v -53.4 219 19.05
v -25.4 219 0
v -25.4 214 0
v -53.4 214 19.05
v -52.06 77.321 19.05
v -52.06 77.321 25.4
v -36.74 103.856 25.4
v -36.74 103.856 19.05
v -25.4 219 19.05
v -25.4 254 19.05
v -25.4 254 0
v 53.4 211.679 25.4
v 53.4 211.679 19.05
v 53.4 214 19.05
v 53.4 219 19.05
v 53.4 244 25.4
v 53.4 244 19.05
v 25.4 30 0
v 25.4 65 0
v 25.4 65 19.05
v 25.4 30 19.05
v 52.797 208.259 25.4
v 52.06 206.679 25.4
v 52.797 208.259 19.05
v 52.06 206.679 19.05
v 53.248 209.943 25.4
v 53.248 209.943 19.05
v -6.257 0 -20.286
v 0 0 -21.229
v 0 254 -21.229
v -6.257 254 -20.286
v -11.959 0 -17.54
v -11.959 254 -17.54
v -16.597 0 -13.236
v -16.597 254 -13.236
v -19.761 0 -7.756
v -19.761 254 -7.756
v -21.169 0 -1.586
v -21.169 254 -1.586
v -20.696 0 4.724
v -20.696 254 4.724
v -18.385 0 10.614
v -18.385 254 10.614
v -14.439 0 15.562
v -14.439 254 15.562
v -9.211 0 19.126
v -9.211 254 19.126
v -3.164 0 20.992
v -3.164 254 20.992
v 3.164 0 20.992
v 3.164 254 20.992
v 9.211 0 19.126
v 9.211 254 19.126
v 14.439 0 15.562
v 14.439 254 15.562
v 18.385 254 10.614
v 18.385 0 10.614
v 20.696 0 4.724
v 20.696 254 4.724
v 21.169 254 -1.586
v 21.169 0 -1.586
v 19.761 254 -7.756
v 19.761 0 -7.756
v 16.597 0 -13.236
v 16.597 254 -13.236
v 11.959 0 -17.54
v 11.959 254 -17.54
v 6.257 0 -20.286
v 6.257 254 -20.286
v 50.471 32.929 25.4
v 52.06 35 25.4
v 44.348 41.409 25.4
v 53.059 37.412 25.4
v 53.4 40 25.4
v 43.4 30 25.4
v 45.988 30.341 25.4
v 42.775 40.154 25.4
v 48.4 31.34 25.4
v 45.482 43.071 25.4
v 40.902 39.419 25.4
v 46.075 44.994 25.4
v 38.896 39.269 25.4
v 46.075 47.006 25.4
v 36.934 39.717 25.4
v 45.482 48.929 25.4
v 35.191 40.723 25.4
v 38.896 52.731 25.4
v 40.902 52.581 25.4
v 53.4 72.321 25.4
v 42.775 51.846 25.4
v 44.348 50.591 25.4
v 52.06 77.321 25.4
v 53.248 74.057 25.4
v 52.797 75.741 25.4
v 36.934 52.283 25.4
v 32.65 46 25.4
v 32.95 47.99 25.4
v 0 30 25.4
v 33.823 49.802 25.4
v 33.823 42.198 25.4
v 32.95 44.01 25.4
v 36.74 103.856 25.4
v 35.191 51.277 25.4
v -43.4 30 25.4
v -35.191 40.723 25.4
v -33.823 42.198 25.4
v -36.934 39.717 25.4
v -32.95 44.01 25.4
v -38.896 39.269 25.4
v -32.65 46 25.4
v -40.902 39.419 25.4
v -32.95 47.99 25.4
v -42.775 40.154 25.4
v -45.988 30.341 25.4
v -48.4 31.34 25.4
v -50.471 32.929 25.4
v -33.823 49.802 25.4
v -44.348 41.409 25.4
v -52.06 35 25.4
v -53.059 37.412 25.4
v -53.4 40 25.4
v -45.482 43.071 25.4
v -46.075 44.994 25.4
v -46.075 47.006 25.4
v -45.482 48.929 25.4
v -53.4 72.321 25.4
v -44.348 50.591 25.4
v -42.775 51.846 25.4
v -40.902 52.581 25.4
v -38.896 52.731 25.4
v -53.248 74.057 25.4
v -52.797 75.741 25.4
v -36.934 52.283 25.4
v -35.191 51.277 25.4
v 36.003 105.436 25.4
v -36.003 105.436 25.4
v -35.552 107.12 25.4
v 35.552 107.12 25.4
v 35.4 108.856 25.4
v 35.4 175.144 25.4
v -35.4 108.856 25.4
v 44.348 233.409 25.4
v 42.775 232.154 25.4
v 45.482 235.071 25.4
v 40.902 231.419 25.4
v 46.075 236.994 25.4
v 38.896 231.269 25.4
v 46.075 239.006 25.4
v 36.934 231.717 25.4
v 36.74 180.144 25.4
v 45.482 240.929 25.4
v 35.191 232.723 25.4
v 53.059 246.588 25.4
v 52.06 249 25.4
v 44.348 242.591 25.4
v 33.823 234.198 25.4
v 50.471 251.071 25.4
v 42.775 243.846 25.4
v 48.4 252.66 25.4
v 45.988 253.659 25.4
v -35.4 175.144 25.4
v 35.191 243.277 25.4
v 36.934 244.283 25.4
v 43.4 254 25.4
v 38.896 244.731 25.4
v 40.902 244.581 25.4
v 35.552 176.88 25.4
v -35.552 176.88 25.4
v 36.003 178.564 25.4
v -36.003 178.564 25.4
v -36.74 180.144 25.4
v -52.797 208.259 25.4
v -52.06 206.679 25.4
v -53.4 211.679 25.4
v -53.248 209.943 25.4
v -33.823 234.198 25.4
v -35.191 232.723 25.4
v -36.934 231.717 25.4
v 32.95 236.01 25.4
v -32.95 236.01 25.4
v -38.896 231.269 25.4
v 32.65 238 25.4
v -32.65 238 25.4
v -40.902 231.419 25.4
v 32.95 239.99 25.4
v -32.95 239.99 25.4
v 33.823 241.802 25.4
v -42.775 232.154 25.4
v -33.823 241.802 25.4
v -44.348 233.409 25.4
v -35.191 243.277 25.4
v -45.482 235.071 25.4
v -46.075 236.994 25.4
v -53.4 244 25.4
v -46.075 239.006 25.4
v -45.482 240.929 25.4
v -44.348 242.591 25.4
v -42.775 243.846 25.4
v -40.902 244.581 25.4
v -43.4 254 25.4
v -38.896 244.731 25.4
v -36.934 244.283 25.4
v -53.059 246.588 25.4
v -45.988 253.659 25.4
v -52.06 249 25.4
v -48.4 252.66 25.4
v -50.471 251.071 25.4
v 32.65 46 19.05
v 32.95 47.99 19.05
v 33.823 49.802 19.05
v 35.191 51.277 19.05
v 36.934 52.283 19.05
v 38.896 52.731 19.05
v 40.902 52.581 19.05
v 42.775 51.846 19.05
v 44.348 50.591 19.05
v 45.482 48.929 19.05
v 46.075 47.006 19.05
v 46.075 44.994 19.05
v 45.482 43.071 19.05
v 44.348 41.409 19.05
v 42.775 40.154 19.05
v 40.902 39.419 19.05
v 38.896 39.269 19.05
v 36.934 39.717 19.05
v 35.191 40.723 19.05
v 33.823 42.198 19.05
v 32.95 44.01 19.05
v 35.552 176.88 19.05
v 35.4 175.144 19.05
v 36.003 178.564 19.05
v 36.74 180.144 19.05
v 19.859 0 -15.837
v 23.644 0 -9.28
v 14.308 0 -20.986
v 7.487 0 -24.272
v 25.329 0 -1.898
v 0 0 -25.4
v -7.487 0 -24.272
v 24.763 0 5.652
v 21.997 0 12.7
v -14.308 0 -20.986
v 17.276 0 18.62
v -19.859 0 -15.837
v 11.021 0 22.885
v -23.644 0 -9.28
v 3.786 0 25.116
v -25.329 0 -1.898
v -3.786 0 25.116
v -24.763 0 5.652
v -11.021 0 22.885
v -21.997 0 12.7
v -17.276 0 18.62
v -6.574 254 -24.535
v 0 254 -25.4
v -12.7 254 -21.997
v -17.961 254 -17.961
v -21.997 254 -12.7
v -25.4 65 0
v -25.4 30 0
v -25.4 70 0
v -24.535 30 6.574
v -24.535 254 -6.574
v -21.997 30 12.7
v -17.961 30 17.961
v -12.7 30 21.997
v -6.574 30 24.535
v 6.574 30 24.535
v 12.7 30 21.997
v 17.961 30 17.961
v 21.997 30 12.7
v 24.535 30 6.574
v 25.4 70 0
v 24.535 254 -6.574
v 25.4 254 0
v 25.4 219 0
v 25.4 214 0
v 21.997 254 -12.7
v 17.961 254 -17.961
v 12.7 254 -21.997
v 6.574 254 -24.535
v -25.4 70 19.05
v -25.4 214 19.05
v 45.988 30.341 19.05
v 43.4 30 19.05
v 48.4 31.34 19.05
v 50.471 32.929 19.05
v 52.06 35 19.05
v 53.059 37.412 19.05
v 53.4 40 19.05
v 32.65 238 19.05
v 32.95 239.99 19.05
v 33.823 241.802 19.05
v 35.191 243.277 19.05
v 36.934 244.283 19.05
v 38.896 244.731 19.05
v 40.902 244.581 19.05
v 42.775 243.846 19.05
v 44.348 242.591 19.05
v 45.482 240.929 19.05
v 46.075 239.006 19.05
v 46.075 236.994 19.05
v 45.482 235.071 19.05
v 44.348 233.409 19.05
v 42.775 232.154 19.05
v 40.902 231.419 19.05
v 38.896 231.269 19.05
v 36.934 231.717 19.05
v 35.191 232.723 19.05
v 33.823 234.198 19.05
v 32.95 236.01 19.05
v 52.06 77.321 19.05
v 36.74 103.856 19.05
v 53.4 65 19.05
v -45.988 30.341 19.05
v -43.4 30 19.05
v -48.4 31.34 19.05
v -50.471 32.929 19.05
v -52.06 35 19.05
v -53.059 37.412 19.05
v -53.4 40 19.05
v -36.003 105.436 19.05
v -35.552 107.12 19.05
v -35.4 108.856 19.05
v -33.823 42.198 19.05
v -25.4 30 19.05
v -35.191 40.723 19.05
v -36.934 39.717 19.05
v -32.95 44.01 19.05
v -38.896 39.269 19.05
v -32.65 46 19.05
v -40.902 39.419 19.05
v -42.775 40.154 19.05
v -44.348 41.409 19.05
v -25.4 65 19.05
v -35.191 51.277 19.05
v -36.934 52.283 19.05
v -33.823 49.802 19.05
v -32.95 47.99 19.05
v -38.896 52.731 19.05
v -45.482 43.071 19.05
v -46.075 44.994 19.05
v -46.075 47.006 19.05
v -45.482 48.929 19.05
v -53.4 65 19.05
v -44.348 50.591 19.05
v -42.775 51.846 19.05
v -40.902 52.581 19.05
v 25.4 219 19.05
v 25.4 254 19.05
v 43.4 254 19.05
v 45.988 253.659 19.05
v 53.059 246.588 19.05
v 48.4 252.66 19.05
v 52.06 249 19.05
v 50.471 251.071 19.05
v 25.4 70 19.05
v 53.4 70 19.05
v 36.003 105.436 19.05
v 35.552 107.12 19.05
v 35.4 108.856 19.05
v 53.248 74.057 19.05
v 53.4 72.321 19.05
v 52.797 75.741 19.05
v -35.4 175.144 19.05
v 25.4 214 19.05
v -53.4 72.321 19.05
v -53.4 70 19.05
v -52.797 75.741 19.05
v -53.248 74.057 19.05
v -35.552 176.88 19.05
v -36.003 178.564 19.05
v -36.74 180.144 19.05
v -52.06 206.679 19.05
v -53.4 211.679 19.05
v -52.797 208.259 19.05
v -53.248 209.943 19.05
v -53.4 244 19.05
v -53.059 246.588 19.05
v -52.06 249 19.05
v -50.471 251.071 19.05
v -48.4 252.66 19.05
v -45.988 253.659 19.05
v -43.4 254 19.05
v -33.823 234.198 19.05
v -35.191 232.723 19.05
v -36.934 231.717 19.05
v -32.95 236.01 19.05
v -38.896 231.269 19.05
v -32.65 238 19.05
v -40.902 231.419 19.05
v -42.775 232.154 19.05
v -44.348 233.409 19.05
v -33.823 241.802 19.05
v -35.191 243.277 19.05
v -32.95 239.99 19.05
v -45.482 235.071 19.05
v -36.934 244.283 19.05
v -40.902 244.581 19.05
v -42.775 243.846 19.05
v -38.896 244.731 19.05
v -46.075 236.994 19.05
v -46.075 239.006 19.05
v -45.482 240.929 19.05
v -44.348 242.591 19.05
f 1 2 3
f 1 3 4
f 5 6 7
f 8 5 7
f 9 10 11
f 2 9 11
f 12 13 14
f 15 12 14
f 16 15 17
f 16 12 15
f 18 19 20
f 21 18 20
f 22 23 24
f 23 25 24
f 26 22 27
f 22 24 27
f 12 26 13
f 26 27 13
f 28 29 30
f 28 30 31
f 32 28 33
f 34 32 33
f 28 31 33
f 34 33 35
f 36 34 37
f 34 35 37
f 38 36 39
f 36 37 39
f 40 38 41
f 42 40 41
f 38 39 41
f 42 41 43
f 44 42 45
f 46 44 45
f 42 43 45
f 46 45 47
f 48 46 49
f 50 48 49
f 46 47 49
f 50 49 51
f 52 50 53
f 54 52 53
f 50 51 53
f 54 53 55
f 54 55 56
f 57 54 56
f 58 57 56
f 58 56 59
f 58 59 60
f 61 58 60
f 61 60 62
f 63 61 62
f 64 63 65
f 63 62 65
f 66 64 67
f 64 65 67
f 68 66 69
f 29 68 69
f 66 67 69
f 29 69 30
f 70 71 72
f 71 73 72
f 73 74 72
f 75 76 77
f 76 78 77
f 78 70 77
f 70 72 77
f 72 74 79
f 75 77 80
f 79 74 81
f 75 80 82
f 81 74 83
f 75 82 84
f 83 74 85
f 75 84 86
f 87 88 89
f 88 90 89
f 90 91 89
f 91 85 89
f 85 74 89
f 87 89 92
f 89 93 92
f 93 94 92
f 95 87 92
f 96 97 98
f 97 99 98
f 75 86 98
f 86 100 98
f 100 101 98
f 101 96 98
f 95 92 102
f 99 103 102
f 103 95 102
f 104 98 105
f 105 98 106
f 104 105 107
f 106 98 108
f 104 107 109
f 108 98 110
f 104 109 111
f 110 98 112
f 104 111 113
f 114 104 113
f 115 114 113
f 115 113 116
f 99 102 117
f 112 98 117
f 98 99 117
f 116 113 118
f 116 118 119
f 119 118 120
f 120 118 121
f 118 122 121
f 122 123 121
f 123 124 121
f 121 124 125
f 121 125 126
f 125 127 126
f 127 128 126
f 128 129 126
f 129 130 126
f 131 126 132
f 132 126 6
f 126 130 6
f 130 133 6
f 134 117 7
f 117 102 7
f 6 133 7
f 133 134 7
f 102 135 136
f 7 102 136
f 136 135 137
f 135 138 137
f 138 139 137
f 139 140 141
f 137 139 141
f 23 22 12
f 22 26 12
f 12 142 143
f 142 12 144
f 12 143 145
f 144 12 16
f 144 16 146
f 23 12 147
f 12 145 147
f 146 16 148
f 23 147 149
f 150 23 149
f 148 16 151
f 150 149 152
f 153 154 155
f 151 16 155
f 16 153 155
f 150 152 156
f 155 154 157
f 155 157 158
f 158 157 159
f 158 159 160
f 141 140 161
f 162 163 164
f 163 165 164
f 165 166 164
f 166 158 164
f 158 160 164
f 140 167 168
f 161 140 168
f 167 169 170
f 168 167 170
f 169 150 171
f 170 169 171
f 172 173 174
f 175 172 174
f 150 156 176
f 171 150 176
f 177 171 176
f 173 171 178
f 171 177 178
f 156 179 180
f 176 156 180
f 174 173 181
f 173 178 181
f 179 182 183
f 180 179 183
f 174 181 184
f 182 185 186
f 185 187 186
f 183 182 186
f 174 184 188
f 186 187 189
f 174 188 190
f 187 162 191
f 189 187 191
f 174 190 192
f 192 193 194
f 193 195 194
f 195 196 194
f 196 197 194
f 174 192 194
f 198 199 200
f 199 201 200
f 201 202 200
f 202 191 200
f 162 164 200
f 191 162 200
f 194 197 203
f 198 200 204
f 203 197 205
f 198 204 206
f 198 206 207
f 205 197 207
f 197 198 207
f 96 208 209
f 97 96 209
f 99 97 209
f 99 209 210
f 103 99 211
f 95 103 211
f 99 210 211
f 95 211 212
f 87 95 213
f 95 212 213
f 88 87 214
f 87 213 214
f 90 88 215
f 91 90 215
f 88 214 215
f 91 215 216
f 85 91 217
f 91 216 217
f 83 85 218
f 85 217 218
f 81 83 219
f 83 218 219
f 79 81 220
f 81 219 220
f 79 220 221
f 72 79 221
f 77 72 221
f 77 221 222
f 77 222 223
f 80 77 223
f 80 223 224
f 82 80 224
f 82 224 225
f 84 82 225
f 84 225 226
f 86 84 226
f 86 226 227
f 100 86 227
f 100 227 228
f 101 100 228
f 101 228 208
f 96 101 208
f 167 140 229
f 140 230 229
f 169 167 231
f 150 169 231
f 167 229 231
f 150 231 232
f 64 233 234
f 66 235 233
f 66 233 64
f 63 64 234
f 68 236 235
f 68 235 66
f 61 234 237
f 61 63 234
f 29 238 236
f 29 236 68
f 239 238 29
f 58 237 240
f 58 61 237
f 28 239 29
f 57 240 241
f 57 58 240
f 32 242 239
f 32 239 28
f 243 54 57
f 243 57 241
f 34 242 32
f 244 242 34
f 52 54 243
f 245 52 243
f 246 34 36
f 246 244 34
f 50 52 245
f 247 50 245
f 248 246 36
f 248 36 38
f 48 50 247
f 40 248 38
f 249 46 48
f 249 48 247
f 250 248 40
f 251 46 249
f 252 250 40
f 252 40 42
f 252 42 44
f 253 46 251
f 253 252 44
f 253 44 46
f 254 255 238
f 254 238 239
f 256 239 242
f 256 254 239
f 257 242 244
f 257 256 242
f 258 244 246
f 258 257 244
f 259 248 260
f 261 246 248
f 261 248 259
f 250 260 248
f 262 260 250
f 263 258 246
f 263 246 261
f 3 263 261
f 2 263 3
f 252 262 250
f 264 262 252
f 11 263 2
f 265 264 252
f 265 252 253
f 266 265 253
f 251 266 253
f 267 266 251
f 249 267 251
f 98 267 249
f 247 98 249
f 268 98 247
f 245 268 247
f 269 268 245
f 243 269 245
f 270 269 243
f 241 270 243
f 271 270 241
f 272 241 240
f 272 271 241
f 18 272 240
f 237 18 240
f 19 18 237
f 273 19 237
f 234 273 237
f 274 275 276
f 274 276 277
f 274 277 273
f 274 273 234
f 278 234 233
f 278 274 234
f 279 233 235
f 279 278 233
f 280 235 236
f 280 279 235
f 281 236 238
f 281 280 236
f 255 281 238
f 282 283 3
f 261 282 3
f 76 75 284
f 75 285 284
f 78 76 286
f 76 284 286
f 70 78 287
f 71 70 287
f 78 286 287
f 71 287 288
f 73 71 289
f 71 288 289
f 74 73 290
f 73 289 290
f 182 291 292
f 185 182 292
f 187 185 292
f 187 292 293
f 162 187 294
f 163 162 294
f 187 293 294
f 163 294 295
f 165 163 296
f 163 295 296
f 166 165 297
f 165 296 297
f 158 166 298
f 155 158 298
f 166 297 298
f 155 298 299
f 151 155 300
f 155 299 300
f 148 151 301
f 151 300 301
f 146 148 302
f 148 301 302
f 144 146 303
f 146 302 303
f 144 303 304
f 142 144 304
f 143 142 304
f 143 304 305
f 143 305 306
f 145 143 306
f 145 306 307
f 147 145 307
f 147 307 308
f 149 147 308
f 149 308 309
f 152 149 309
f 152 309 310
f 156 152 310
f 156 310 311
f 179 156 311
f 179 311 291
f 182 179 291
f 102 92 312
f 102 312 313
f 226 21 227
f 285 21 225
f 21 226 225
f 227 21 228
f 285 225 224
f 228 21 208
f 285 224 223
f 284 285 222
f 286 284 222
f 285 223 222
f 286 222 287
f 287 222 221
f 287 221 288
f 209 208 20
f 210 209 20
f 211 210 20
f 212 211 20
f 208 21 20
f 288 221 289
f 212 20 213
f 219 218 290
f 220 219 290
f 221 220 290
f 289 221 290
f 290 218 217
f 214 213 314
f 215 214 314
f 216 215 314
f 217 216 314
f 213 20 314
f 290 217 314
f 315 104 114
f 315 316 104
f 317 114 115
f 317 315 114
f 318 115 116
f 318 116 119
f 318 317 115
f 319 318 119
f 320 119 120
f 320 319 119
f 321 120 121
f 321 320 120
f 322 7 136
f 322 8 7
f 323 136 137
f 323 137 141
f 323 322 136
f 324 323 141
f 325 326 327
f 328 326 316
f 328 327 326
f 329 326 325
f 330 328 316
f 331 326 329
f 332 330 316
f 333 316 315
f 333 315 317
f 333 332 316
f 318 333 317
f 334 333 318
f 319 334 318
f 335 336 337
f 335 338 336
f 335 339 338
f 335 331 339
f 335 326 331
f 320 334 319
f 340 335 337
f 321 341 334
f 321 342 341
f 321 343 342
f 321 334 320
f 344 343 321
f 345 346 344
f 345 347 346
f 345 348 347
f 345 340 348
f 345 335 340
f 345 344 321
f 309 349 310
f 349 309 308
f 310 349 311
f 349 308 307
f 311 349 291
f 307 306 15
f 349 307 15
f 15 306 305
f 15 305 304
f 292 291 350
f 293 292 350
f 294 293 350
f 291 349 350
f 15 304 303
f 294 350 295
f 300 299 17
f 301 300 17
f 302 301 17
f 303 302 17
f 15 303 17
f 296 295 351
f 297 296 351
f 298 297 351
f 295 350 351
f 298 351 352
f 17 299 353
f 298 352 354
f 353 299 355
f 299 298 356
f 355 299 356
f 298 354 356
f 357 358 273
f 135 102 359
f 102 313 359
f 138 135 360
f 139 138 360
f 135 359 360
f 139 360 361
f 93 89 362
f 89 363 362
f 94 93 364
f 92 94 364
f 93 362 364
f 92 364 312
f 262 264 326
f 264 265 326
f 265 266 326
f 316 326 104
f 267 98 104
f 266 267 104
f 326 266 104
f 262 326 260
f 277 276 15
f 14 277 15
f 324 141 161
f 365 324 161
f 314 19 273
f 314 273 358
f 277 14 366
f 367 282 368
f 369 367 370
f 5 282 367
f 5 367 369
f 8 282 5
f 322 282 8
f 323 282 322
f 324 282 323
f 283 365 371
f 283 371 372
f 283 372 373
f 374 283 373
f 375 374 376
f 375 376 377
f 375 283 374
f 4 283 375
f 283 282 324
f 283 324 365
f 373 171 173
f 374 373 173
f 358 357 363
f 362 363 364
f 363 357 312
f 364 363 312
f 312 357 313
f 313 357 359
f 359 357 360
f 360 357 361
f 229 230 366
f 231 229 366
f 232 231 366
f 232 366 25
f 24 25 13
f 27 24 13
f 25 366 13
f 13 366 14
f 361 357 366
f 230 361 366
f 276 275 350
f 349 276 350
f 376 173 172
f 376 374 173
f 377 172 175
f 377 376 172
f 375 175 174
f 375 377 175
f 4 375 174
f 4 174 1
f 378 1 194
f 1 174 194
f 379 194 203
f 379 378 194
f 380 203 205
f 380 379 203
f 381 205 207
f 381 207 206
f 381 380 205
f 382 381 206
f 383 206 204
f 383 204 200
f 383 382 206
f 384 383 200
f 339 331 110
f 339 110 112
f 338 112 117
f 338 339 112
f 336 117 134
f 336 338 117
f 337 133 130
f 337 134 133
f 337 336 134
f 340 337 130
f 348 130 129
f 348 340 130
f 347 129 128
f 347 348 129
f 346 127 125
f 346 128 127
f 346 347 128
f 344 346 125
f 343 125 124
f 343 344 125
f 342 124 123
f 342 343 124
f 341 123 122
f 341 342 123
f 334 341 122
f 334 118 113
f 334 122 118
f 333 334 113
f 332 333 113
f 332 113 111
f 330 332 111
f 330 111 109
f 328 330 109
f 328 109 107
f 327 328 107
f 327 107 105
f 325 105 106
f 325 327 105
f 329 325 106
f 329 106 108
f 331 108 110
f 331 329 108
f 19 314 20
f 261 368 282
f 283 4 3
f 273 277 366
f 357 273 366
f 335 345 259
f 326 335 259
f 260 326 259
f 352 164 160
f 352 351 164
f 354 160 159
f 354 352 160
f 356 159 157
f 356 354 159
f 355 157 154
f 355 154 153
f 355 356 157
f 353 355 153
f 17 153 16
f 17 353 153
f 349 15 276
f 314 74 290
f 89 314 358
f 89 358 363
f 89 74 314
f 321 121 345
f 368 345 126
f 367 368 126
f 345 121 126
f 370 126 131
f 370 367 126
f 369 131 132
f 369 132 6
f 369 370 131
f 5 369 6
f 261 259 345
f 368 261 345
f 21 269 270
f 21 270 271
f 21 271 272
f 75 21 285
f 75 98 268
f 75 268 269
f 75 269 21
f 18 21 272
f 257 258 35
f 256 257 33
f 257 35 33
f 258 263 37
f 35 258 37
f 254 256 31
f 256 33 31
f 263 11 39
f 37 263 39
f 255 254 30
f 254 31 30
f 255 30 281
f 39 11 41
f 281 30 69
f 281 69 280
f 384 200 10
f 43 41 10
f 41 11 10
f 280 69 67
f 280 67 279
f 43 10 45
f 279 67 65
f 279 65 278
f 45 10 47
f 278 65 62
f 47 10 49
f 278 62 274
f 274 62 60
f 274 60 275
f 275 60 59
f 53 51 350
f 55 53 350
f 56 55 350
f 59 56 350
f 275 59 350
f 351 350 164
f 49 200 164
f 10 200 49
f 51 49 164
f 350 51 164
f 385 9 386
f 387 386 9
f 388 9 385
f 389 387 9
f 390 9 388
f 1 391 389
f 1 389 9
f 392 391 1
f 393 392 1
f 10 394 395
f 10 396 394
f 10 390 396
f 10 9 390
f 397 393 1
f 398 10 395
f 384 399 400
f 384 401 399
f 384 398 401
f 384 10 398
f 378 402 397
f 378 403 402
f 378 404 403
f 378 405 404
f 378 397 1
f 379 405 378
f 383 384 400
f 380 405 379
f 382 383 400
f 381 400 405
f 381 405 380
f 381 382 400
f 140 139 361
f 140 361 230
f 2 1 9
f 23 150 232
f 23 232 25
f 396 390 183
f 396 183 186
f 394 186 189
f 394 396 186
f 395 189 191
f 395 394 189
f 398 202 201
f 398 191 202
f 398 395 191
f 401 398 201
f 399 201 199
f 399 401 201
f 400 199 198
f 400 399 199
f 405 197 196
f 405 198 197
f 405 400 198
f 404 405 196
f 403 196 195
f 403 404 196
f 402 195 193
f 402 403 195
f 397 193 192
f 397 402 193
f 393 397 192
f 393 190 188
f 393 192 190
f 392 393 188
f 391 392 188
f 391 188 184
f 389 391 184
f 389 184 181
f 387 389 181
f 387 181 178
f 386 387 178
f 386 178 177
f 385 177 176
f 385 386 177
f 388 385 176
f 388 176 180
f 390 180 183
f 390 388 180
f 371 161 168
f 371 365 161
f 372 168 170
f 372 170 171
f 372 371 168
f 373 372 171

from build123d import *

# Parameters (mm, degrees)
BOSS_EXTRUDE1_START   = -224
BOSS_EXTRUDE1_DEPTH   = 224
BOSS_EXTRUDE2_DEPTH   = 6.35
BOSS_EXTRUDE3_DEPTH   = 5
M12_CLEARANCE_HOLE1_D = 13.5
FILLET1_R             = 10
MIRROR1_COPY_1_DEPTH  = 5
FILLET1_OF_MIRROR1_R  = 10


with BuildPart() as part:
    # Sketch12 → Revolve1 (revolve)
    with BuildSketch(Plane.XY, mode=Mode.PRIVATE) as revolve1_sk:
        Polygon((-25.4, 0), (-25.4, 254), (-21.22866, 254), (-21.22866, 127), (-21.22866, 0), align=None)
    revolve(revolve1_sk.sketch.rotate(Axis((0, 0, 0), (0, 1, 0)), 270), axis=Axis((0, 0, 0), (0, 1, 0)))

    # Sketch14 → Boss-Extrude1 (add)
    with BuildSketch(Plane(origin=(0, 30, 0), x_dir=(-1, 0, 0), z_dir=(0, -1, 0)).offset(BOSS_EXTRUDE1_START)):
        with BuildLine():
            Line((-25.4, 0), (-25.4, -25.4))
            Line((-25.4, -25.4), (-3.2e-08, -25.4))
            ThreePointArc((-3.2e-08, -25.4), (-17.960512254, -17.960512231), (-25.4, 0))
        make_face()
        with BuildLine():
            ThreePointArc((25.4, 0), (17.960512231, -17.960512254), (-3.2e-08, -25.4))
            Line((-3.2e-08, -25.4), (25.4, -25.4))
            Line((25.4, -25.4), (25.4, 0))
        make_face()
    extrude(amount=BOSS_EXTRUDE1_DEPTH)

    # Sketch27 → Boss-Extrude2 (add)
    with BuildSketch(Plane.XY.offset(25.4)):
        Polygon((25.4, 254), (25.4, 30), (53.4, 30), (53.4, 75), (35.4, 106.176914536), (35.4, 177.823085464), (53.4, 209), (53.4, 254), align=None)
    boss_extrude2 = extrude(amount=-BOSS_EXTRUDE2_DEPTH)

    # Sketch32 → Boss-Extrude3 (add)
    with BuildSketch(Plane(origin=(0, 65, 0), x_dir=(-1, 0, 0), z_dir=(0, -1, 0))):
        Polygon((-53.4, -19.05), (-25.4, -19.05), (-25.4, 0), align=None)
    boss_extrude3 = extrude(amount=-BOSS_EXTRUDE3_DEPTH)

    # Mirror2: Boss-Extrude3 across plane
    add(boss_extrude3.mirror(Plane(origin=(0, 142, 0), x_dir=(0, 0, 1), z_dir=(0, -1, 0))))

    # M12 Clearance Hole1 (through all)
    with Locations(Plane.XY.offset(25.4)):
        with Locations((39.4, 46), (39.4, 238)):
            m12_clearance_hole1 = Hole(M12_CLEARANCE_HOLE1_D / 2)

    # Fillet1
    fillet1_edges = [part.edges().sort_by_distance(p)[0] for p in [
        (53.4, 254, 22.225),
        (53.4, 209, 22.225),
        (35.4, 177.823085464, 22.225),
        (35.4, 106.176914536, 22.225),
        (53.4, 75, 22.225),
        (53.4, 30, 22.225),
    ]]
    fillet(fillet1_edges, radius=FILLET1_R)

    # Mirror1: Boss-Extrude2, Boss-Extrude3, M12 Clearance Hole1 across plane
    add(boss_extrude2.mirror(Plane(origin=(0, 0, 0), x_dir=(0, 0, 1), z_dir=(1, 0, 0))))
    add(boss_extrude3.mirror(Plane(origin=(0, 0, 0), x_dir=(0, 0, 1), z_dir=(1, 0, 0))))
    add(m12_clearance_hole1.mirror(Plane(origin=(0, 0, 0), x_dir=(0, 0, 1), z_dir=(1, 0, 0))), mode=Mode.SUBTRACT)

    # Mirror1 copy 1 sketch → Mirror1 copy 1 (add)
    with BuildSketch(Plane(origin=(0, 219, 0), x_dir=(1, 0, 0), z_dir=(0, 1, 0))):
        Polygon((-53.4, -19.05), (-25.4, -19.05), (-25.4, 0), align=None)
    extrude(amount=-MIRROR1_COPY_1_DEPTH)

    # Fillet1 of Mirror1
    fillet1_of_mirror1_edges = [part.edges().sort_by_distance(p)[0] for p in [
        (-53.4, 254, 22.225),
        (-53.4, 209, 22.225),
        (-35.4, 177.823085464, 22.225),
        (-35.4, 106.176914536, 22.225),
        (-53.4, 75, 22.225),
        (-53.4, 30, 22.225),
    ]]
    fillet(fillet1_of_mirror1_edges, radius=FILLET1_OF_MIRROR1_R)


solid = part.part
